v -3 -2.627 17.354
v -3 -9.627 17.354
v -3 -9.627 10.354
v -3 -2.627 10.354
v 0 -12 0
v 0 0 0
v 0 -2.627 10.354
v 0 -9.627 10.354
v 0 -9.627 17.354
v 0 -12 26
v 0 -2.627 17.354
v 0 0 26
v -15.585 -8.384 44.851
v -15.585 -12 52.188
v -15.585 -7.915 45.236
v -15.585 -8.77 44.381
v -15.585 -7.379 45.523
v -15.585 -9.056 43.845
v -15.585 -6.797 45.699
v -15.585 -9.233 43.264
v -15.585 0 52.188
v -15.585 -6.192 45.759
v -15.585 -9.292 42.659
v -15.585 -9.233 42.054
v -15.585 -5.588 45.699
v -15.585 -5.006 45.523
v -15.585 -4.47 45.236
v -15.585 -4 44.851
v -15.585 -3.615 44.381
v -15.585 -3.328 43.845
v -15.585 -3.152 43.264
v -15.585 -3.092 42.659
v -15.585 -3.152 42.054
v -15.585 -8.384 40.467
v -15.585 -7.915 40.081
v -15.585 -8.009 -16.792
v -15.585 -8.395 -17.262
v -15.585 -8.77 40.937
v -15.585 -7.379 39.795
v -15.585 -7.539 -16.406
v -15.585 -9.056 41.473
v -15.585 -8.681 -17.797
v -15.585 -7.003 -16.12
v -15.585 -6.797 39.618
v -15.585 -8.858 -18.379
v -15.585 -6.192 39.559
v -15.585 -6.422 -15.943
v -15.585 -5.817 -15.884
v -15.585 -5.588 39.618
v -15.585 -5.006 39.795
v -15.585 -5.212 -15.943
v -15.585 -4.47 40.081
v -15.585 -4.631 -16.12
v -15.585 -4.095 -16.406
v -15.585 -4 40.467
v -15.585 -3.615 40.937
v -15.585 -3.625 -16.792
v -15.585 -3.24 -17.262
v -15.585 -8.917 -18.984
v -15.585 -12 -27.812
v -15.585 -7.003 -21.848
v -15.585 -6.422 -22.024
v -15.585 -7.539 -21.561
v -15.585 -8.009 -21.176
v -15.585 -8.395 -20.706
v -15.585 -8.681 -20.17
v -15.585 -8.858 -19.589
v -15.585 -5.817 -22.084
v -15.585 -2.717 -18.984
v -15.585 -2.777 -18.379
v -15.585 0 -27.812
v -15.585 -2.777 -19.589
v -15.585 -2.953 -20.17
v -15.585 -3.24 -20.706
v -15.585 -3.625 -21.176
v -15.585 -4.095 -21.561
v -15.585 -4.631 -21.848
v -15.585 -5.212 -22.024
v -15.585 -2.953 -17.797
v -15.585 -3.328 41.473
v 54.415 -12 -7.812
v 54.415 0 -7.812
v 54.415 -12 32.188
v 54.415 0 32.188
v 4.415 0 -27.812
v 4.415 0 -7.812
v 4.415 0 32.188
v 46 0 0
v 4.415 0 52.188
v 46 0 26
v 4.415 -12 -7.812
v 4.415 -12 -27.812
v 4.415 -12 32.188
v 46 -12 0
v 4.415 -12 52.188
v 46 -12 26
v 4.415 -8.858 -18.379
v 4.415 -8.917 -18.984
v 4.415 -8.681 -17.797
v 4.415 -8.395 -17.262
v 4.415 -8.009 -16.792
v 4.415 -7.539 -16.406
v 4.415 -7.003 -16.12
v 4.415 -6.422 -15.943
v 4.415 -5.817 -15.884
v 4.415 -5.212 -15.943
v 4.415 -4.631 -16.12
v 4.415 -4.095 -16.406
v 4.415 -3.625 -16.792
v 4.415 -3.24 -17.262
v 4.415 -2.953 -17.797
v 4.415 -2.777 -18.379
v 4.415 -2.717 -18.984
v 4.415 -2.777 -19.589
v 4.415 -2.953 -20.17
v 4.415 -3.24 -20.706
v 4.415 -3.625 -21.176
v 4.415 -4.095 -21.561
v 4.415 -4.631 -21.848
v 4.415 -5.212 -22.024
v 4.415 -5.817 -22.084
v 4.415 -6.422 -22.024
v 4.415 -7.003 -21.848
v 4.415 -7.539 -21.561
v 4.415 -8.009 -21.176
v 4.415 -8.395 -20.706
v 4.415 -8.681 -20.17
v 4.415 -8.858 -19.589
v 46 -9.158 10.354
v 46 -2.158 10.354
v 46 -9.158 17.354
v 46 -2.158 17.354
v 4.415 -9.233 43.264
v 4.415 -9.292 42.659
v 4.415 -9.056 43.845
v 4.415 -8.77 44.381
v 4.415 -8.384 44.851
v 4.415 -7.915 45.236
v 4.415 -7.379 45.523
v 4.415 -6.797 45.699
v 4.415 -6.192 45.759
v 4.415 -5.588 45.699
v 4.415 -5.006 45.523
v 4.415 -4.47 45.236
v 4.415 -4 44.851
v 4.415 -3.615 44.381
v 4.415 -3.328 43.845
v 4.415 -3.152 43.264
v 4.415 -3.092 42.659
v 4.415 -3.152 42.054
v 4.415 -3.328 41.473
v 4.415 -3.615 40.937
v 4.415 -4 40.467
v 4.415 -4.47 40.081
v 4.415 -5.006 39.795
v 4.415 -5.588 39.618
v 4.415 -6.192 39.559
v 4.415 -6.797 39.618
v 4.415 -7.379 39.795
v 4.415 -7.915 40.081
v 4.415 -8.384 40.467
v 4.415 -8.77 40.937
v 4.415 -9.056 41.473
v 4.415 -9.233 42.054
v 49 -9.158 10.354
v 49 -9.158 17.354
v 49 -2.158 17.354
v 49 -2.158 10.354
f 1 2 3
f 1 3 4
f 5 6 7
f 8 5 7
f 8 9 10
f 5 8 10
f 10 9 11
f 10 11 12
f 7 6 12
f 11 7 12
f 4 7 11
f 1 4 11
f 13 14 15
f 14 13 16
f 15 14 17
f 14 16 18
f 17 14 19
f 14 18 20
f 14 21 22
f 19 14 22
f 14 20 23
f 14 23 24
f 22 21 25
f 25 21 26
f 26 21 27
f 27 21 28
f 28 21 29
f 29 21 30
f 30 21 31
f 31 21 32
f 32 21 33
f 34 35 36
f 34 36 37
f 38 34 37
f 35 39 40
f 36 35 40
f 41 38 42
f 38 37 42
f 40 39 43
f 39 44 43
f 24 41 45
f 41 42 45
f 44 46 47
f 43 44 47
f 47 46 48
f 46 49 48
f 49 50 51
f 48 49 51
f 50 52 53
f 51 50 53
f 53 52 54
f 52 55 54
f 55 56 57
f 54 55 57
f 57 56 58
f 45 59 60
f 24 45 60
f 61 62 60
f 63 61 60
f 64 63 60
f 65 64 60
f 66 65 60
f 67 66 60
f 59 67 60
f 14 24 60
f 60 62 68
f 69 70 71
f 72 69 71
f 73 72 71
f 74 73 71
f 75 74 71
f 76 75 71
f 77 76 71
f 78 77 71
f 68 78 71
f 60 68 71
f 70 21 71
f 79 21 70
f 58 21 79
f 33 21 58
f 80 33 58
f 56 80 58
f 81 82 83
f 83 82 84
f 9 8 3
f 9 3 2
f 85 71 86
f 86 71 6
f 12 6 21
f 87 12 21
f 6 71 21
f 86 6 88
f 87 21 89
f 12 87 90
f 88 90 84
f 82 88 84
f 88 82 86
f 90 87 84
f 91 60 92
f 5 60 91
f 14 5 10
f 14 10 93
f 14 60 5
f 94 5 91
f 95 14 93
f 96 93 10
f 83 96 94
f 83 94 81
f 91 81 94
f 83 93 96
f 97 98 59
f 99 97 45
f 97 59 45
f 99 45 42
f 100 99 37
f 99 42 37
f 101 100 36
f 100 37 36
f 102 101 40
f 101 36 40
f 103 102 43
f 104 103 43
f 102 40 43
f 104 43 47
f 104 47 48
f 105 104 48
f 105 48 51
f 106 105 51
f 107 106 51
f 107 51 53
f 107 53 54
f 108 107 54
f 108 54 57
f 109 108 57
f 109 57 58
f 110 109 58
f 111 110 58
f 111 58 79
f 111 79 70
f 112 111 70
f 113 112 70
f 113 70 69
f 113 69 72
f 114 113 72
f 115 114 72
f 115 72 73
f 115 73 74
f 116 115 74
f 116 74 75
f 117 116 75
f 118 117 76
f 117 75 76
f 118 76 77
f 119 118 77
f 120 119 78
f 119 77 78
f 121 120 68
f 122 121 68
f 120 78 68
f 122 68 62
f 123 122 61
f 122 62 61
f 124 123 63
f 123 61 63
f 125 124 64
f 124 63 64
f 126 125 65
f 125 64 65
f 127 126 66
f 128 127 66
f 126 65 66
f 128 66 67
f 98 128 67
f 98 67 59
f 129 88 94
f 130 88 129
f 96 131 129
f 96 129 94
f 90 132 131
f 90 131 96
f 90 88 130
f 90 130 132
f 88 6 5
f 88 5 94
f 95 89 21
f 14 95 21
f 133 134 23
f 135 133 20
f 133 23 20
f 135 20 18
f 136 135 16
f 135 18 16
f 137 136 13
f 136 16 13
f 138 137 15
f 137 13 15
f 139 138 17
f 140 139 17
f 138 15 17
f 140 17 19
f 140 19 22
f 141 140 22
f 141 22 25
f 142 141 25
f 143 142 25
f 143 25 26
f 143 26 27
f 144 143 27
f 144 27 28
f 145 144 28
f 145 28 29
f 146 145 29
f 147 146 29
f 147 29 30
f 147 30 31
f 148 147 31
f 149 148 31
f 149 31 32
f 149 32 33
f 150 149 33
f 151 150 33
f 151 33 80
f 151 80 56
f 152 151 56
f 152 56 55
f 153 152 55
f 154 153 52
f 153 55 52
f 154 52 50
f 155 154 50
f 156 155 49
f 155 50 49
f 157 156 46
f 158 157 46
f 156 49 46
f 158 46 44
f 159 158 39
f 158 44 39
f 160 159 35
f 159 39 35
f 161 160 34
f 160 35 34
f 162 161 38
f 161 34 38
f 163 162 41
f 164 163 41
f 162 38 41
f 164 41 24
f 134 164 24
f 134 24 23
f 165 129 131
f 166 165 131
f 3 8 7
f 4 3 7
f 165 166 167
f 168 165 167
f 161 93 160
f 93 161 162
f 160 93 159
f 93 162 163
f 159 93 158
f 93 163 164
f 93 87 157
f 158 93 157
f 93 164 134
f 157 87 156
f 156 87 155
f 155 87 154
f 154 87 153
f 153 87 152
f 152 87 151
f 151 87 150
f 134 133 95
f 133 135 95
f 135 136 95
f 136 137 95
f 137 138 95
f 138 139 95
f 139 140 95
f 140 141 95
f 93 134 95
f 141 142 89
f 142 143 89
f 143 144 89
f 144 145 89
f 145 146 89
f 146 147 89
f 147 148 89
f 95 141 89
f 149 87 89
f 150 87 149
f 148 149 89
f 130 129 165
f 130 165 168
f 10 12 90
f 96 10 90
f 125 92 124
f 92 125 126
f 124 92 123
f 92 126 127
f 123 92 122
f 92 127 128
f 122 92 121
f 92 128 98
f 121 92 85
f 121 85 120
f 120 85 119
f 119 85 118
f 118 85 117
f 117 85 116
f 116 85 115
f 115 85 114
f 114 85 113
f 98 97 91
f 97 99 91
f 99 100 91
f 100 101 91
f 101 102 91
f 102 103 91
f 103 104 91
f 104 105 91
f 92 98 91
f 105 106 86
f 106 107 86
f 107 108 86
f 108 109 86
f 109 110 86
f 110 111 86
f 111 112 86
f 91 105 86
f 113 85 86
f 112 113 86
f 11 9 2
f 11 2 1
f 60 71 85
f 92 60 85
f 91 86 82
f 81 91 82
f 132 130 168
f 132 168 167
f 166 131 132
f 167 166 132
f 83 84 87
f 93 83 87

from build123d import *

# Parameters (mm, degrees)
F0_W      = 46
F0_H      = 26
F2_DEPTH  = 12
F4_D      = 6.2
F5_D      = 6.2
F7_W      = 7
F7_H      = 7
F8_DEPTH  = 3
F9_W      = 7
F9_H      = 7
F10_DEPTH = 3


with BuildPart() as f2:
    # F0 (on Front) → F2 (new body)
    with BuildSketch(Plane.XZ):
        Polygon((4.415234, -27.81175), (4.415234, -7.81175), (54.415234, -7.81175), (54.415234, 32.18825), (4.415234, 32.18825), (4.415234, 52.18825), (-15.584766, 52.18825), (-15.584766, -27.81175), align=None)
        with Locations((23, 13)):
            Rectangle(F0_W, F0_H, mode=Mode.SUBTRACT)
    extrude(amount=F2_DEPTH)

    # F4 (through all)
    with Locations(Plane.YZ.offset(25)):
        with Locations((-6.192415, 42.658858)):
            Hole(F4_D / 2)

    # F5 (through all)
    with Locations(Plane.YZ.offset(25)):
        with Locations((-5.817117, -18.983817)):
            Hole(F5_D / 2)

    # F7 (on Right) → F8 (cut)
    with BuildSketch(Plane.YZ):
        with Locations((-6.127085, 13.853554)):
            Rectangle(F7_W, F7_H)
    extrude(amount=-F8_DEPTH, mode=Mode.SUBTRACT)

    # F9 (on offset) → F10 (cut)
    with BuildSketch(Plane.YZ.offset(46)):
        with Locations((-5.657963, 13.853554)):
            Rectangle(F9_W, F9_H)
    extrude(amount=F10_DEPTH, mode=Mode.SUBTRACT)


solid = f2.part
